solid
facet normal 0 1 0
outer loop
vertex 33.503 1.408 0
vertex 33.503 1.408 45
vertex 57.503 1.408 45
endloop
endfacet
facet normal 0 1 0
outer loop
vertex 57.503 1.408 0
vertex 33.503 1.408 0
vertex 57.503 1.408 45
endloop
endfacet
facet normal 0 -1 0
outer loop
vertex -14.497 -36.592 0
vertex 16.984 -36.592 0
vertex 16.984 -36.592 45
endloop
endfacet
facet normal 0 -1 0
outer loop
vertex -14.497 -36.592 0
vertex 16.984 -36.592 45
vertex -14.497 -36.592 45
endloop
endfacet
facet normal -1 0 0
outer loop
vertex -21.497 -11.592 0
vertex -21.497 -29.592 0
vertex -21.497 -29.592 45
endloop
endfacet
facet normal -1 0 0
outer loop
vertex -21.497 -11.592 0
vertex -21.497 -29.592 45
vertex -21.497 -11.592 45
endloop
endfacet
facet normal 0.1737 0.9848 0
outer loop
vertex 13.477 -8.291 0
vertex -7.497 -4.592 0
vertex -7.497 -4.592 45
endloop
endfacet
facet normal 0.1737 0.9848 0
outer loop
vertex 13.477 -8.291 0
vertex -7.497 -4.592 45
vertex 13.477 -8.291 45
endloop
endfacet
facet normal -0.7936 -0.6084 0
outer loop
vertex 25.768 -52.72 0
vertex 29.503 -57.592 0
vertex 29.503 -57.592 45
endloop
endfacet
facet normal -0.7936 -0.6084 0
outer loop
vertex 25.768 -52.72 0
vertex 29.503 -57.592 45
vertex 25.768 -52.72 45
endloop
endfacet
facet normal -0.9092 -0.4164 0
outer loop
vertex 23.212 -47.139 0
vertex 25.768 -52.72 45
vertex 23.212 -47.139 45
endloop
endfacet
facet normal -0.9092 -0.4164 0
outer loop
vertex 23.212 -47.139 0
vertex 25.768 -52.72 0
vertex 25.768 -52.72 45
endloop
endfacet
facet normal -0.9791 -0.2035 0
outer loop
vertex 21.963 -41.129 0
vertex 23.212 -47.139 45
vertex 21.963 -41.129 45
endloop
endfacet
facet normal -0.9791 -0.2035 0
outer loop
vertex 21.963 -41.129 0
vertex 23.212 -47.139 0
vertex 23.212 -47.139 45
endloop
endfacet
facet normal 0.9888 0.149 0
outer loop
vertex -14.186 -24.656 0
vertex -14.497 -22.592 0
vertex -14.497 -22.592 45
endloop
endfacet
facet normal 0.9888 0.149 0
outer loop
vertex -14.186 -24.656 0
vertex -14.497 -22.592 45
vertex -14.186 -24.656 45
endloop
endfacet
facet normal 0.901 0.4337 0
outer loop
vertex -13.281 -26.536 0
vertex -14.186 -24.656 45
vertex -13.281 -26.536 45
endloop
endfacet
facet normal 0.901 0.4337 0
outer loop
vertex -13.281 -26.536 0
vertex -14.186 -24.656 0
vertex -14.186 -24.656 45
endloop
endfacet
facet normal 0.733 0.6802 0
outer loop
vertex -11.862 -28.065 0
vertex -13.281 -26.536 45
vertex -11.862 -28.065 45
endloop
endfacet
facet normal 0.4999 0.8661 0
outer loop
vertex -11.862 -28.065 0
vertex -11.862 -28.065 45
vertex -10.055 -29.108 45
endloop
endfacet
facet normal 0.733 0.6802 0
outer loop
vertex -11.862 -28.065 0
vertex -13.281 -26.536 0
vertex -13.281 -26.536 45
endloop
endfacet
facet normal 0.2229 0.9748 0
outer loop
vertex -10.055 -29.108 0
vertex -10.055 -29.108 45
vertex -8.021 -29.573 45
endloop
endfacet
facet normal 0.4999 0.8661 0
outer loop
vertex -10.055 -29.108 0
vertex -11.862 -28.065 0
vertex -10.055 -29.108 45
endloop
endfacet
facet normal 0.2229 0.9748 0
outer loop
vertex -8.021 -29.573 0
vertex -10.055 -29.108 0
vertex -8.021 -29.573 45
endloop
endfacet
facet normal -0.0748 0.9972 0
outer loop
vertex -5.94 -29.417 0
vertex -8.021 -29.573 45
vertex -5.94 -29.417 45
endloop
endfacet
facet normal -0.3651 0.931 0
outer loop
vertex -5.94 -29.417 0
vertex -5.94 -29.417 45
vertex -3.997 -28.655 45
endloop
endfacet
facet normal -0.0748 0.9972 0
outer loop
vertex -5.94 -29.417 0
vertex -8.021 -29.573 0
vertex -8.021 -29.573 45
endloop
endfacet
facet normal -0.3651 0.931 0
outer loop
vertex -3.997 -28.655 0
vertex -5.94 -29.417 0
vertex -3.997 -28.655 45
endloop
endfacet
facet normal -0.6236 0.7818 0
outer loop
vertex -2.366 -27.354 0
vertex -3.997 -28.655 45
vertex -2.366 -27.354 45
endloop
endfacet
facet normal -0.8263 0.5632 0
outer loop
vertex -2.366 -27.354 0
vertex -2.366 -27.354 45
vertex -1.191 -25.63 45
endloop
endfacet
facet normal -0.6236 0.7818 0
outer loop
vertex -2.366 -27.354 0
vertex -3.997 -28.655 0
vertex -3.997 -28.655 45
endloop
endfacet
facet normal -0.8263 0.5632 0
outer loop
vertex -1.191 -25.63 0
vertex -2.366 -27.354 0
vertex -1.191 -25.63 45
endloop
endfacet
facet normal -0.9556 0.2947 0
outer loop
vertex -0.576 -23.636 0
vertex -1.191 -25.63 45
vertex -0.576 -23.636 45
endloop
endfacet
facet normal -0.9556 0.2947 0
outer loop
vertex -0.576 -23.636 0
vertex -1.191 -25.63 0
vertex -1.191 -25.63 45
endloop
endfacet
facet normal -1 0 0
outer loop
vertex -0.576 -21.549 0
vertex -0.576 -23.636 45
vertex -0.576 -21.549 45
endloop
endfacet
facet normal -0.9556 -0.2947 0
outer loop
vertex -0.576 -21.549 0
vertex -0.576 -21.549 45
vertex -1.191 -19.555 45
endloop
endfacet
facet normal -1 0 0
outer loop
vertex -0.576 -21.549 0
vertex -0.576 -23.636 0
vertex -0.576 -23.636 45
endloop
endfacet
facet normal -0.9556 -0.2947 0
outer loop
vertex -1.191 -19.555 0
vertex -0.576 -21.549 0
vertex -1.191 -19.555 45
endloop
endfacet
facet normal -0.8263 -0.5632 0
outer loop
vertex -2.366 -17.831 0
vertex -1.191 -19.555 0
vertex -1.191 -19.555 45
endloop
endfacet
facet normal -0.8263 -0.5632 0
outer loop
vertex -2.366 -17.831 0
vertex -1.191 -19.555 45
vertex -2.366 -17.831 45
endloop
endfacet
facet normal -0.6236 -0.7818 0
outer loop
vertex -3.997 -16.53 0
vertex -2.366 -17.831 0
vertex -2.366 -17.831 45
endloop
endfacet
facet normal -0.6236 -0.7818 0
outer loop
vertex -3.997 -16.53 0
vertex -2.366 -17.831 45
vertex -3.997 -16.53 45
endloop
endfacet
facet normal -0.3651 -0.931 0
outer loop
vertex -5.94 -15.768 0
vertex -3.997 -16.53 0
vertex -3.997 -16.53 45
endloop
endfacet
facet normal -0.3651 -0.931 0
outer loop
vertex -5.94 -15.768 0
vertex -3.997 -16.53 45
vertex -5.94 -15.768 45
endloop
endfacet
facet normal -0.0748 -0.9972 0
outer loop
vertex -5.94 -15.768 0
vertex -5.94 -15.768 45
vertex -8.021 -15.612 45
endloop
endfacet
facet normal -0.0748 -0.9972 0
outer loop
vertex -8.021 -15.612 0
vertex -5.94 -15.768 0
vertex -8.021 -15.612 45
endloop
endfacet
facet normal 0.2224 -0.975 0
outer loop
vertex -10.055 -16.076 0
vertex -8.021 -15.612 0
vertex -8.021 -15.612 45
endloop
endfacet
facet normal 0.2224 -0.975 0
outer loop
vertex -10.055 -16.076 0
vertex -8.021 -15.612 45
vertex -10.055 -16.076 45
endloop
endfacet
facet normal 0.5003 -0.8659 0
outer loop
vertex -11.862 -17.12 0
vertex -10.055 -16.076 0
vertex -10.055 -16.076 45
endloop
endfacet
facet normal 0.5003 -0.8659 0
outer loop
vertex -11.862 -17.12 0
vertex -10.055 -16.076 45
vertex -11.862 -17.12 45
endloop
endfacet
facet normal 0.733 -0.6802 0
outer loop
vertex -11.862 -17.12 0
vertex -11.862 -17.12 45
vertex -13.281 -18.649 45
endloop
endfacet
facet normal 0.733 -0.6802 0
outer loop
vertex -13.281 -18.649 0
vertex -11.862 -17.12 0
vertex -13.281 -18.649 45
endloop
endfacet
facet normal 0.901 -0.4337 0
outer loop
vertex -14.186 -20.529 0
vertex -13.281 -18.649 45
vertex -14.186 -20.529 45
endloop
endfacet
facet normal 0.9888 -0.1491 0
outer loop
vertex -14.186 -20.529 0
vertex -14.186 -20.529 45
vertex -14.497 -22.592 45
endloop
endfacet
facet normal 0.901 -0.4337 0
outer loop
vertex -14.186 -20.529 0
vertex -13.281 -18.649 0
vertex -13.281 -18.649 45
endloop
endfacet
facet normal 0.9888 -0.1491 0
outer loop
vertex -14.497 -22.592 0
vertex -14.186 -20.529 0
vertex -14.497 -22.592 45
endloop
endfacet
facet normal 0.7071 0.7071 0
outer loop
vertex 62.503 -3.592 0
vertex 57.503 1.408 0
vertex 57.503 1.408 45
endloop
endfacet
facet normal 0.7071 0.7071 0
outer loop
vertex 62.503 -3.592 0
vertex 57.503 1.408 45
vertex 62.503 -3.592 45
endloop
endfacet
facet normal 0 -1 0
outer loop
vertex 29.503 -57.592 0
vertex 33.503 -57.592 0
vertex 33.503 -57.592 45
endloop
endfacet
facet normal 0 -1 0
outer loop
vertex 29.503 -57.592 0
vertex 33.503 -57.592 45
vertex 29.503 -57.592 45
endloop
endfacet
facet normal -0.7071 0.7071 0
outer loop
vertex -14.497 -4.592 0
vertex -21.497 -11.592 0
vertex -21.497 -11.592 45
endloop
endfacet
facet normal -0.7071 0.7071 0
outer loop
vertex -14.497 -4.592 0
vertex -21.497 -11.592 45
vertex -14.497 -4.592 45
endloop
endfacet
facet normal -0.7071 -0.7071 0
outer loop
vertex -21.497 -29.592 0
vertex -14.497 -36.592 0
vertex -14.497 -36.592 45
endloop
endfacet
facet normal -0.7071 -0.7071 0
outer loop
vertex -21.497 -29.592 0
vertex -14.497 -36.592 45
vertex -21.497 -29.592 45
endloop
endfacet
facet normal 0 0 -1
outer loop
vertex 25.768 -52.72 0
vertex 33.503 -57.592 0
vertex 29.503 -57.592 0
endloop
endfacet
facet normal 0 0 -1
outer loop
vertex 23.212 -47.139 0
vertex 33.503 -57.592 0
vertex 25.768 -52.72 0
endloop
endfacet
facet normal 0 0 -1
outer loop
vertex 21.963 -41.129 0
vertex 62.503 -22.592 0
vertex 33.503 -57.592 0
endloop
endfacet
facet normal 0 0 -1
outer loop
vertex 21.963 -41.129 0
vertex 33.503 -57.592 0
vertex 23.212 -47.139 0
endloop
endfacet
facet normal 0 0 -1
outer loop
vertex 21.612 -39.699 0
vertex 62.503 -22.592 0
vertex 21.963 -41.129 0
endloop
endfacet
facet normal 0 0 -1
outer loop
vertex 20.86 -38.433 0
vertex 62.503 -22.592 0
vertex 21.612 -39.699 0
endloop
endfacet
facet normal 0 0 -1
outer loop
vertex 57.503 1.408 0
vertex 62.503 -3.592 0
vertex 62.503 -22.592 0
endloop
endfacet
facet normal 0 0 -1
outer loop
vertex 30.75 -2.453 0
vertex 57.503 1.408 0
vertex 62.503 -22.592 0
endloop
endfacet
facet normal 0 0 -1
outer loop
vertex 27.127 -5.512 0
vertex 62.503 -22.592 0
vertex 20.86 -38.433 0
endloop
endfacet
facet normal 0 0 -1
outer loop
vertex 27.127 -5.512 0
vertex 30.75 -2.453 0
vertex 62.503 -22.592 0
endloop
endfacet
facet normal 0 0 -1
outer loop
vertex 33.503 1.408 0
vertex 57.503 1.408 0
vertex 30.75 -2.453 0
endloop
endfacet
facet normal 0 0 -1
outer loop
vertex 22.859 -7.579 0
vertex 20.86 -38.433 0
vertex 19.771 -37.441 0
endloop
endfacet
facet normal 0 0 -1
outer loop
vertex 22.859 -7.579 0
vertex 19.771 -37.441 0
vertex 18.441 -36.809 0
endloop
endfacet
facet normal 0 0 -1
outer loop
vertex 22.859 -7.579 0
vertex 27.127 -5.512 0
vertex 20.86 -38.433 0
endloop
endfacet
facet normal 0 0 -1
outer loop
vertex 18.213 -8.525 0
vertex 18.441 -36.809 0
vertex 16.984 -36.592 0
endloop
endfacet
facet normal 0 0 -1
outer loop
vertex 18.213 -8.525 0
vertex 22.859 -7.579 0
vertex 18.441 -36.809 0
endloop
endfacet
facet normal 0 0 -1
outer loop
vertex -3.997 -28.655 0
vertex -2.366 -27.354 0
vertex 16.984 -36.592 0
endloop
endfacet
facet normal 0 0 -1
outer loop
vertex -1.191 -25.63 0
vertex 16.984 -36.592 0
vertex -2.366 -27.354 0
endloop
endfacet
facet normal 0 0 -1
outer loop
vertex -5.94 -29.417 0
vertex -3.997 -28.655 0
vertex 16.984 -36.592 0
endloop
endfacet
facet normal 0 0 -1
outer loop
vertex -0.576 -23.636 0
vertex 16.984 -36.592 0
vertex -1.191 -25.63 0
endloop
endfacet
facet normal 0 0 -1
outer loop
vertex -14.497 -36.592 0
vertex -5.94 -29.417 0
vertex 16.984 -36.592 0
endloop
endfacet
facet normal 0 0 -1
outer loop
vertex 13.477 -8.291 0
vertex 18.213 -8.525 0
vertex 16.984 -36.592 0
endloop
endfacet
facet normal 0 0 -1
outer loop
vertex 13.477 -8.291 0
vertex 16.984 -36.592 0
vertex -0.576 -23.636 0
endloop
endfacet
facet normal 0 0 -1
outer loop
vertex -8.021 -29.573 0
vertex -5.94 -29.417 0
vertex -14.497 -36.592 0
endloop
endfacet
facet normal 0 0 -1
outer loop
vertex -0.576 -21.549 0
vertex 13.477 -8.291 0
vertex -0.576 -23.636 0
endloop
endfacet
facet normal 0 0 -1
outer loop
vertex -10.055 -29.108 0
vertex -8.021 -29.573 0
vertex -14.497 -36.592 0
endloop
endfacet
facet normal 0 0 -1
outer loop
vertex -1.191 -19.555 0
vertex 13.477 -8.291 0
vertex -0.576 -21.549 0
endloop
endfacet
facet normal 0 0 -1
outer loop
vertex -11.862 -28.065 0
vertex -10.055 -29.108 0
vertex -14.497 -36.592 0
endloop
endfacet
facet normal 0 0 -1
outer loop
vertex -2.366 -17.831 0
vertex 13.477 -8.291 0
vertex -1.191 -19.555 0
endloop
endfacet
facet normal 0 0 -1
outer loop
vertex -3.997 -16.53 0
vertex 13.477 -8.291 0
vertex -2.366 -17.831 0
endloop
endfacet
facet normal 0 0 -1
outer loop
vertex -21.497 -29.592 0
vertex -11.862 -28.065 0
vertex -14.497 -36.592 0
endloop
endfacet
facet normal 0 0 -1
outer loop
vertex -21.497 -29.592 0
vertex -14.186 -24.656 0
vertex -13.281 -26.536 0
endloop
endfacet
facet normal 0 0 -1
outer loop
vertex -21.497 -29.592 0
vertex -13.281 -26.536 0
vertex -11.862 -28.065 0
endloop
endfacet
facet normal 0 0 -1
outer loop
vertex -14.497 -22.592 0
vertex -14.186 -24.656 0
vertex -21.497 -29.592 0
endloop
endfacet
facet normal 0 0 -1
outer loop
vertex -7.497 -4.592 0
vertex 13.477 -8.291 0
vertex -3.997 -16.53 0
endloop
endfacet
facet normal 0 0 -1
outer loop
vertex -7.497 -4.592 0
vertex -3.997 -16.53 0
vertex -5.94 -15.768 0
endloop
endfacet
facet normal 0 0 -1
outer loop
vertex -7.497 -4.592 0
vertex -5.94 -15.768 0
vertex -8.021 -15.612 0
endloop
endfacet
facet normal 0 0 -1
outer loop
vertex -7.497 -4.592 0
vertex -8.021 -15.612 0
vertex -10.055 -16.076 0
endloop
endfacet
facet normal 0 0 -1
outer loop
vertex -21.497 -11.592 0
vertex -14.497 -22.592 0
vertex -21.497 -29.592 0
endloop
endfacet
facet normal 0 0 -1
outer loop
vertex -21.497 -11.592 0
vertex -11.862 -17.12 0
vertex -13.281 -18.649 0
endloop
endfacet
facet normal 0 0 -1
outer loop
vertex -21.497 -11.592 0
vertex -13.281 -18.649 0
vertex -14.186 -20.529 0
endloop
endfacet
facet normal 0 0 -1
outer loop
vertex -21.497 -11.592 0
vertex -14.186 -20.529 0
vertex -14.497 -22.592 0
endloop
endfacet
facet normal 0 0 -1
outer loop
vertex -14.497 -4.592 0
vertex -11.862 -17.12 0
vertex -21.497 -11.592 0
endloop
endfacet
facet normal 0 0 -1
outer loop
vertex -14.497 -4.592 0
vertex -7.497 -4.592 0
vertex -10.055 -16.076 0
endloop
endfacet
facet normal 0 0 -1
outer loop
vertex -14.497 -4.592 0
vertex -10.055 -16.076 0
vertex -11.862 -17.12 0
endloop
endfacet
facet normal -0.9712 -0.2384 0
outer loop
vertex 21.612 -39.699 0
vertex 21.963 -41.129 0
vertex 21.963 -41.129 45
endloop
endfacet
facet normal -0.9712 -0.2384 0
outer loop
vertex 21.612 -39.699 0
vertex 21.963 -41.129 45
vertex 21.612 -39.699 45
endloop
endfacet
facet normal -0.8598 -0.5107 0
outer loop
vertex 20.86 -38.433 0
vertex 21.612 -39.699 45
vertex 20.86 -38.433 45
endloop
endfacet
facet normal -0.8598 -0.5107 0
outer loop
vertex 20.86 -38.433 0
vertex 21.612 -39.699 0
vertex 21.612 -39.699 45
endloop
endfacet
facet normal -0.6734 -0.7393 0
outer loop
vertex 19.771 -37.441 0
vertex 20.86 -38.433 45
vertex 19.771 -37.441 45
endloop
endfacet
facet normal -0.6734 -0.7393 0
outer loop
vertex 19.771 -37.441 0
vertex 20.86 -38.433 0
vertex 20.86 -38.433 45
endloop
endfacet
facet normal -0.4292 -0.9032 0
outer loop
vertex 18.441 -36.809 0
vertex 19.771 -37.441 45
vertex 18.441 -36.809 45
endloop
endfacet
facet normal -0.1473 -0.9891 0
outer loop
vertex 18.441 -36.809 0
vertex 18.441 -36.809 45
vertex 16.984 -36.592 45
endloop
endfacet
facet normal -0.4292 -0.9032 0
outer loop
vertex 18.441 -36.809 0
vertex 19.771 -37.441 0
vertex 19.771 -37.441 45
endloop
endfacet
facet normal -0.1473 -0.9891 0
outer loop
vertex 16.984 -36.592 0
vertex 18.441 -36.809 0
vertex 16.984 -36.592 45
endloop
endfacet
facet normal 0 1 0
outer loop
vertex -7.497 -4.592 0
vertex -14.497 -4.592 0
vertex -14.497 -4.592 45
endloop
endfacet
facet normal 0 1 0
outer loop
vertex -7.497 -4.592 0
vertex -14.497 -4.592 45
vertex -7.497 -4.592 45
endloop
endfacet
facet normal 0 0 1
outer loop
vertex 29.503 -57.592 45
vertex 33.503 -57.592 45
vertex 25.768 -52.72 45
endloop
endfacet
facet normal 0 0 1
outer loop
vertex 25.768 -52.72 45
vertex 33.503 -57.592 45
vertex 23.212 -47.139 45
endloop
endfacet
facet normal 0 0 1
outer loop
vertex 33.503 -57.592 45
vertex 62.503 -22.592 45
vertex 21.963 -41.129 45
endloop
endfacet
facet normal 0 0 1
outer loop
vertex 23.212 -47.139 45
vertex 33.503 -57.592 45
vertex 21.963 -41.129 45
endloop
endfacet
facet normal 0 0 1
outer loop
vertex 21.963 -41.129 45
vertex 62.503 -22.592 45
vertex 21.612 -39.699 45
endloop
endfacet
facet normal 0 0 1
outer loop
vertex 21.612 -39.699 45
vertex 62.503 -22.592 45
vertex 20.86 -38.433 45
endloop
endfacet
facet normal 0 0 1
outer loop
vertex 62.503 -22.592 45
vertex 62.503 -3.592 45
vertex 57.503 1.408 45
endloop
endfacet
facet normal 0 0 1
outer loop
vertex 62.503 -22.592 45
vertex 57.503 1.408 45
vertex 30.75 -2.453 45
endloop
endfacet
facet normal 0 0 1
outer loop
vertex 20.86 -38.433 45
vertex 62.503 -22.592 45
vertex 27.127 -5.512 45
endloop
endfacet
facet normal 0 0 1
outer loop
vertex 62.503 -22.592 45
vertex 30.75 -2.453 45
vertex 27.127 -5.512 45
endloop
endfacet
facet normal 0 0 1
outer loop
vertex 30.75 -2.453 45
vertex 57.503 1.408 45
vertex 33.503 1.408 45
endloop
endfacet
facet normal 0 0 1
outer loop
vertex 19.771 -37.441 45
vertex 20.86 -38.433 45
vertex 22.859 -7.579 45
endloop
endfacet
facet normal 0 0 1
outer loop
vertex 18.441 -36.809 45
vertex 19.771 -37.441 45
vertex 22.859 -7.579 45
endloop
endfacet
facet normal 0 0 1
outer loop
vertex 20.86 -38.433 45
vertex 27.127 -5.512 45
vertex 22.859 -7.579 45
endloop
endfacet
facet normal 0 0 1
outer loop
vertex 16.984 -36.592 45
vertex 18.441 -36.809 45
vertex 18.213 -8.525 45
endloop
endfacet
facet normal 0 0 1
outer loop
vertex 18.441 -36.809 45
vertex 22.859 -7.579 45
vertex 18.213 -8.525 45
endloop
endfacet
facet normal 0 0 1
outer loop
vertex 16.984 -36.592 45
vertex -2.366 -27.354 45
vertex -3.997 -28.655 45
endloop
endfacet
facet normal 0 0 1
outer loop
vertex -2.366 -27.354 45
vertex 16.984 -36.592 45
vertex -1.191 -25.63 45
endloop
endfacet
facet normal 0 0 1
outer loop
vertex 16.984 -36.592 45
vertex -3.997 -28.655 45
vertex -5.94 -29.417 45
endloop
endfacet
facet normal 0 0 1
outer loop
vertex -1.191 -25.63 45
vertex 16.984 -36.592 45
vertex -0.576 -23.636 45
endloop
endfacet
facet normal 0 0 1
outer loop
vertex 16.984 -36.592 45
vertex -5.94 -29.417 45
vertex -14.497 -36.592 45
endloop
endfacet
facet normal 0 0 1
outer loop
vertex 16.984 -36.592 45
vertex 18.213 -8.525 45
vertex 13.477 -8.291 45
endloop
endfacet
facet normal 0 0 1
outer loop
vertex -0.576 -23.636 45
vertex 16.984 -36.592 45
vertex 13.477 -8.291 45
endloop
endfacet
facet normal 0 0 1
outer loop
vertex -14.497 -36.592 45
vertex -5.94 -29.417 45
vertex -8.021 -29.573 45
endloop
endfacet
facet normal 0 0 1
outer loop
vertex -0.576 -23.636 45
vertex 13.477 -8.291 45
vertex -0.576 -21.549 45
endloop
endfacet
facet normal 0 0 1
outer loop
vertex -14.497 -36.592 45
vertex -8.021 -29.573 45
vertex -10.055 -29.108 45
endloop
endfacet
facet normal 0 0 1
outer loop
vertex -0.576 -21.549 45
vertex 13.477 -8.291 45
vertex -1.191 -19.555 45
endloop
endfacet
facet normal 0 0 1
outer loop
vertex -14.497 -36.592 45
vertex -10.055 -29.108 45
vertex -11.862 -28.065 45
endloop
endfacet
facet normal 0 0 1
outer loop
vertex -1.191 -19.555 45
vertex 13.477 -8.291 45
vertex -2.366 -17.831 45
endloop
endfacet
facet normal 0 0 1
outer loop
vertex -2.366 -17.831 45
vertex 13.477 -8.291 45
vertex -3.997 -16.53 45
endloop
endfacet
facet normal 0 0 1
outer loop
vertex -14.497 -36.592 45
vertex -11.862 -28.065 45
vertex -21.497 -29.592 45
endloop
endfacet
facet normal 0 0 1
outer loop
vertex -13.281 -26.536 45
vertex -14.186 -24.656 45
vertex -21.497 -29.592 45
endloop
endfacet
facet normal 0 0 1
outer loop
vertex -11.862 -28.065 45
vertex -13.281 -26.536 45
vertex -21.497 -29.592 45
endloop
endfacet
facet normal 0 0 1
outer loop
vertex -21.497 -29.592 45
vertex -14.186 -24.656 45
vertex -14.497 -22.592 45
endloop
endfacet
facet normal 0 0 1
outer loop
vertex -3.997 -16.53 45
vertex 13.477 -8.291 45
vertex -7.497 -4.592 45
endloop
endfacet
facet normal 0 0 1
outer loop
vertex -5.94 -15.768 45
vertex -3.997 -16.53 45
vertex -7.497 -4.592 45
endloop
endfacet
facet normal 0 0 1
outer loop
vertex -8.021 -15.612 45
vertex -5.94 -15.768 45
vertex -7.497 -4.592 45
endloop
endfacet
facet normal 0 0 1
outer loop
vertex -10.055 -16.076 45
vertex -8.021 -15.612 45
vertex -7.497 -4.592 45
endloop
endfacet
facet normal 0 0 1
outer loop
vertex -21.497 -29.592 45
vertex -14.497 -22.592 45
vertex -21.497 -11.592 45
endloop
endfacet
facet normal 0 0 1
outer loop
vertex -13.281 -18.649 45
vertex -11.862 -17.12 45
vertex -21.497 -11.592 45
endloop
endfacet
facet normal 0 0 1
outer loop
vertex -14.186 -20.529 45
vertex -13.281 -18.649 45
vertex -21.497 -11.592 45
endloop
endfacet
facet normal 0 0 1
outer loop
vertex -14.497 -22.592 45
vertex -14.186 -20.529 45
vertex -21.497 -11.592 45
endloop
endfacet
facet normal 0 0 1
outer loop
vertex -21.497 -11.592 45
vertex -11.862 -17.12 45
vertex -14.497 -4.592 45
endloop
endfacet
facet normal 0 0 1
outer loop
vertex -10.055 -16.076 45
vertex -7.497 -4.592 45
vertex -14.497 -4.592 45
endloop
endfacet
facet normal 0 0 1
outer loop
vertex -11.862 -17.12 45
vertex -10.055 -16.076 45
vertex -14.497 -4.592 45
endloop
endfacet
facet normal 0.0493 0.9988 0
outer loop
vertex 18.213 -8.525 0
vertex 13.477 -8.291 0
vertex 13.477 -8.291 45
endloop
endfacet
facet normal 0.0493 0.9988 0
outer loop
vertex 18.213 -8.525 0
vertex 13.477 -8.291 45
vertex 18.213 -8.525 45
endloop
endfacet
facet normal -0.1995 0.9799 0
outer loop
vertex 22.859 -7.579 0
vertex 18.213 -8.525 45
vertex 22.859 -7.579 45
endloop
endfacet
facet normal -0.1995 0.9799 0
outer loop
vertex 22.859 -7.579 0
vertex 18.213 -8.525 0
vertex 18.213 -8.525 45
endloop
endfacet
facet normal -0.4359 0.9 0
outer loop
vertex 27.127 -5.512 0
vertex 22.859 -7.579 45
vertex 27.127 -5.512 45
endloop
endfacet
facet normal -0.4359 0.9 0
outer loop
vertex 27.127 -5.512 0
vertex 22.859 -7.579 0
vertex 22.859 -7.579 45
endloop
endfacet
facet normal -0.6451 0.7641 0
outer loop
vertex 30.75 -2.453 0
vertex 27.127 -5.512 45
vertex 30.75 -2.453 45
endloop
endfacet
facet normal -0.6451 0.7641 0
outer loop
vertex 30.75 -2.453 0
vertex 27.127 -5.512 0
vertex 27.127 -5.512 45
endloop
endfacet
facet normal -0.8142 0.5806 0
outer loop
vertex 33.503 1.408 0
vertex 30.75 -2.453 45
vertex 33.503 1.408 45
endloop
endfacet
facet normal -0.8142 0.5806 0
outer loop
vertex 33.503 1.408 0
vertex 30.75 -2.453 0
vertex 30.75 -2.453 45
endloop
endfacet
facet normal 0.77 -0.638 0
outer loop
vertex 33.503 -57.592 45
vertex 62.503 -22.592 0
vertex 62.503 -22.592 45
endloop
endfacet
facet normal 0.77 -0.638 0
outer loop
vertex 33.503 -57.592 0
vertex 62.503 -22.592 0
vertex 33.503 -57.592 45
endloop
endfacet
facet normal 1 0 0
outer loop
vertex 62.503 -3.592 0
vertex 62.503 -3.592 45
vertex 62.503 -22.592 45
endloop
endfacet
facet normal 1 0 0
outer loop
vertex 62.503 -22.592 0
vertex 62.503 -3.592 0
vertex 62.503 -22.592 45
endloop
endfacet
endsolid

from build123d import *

# Parameters (mm, degrees)
ESQUISSE1_R        = 7
BOSS_EXTRU_2_DEPTH = 45


with BuildPart() as part:
    # Esquisse1 → Boss.-Extru.2 (new body)
    with BuildSketch(Plane.XY):
        with BuildLine():
            Line((33.502581987, 1.407665382), (57.502581987, 1.407665382))
            Line((57.502581987, 1.407665382), (62.502581987, -3.592334618))
            Line((62.502581987, -3.592334618), (62.502581987, -22.592334618))
            Line((62.502581987, -22.592334618), (33.502581987, -57.592334618))
            Line((33.502581987, -57.592334618), (29.502581987, -57.592334618))
            ThreePointArc((29.502581987, -57.592334618), (24.333450387, -50.001682761), (21.96277386, -41.129376977))
            ThreePointArc((21.96277386, -41.129376977), (20.352131518, -37.896743447), (16.984252973, -36.592334618))
            Line((16.984252973, -36.592334618), (-14.497418013, -36.592334618))
            Line((-14.497418013, -36.592334618), (-21.497418013, -29.592334618))
            Line((-21.497418013, -29.592334618), (-21.497418013, -11.592334618))
            Line((-21.497418013, -11.592334618), (-14.497418013, -4.592334618))
            Line((-14.497418013, -4.592334618), (-7.497418013, -4.592334618))
            Line((-7.497418013, -4.592334618), (13.477054889, -8.290700097))
            ThreePointArc((13.477054889, -8.290700097), (25.057973951, -6.679500169), (33.502581987, 1.407665382))
        make_face()
        with Locations(Location((-7.497418013, -22.592334618, 0), (0, 0, 180))):
            Circle(ESQUISSE1_R, mode=Mode.SUBTRACT)
    extrude(amount=BOSS_EXTRU_2_DEPTH)


solid = part.part
